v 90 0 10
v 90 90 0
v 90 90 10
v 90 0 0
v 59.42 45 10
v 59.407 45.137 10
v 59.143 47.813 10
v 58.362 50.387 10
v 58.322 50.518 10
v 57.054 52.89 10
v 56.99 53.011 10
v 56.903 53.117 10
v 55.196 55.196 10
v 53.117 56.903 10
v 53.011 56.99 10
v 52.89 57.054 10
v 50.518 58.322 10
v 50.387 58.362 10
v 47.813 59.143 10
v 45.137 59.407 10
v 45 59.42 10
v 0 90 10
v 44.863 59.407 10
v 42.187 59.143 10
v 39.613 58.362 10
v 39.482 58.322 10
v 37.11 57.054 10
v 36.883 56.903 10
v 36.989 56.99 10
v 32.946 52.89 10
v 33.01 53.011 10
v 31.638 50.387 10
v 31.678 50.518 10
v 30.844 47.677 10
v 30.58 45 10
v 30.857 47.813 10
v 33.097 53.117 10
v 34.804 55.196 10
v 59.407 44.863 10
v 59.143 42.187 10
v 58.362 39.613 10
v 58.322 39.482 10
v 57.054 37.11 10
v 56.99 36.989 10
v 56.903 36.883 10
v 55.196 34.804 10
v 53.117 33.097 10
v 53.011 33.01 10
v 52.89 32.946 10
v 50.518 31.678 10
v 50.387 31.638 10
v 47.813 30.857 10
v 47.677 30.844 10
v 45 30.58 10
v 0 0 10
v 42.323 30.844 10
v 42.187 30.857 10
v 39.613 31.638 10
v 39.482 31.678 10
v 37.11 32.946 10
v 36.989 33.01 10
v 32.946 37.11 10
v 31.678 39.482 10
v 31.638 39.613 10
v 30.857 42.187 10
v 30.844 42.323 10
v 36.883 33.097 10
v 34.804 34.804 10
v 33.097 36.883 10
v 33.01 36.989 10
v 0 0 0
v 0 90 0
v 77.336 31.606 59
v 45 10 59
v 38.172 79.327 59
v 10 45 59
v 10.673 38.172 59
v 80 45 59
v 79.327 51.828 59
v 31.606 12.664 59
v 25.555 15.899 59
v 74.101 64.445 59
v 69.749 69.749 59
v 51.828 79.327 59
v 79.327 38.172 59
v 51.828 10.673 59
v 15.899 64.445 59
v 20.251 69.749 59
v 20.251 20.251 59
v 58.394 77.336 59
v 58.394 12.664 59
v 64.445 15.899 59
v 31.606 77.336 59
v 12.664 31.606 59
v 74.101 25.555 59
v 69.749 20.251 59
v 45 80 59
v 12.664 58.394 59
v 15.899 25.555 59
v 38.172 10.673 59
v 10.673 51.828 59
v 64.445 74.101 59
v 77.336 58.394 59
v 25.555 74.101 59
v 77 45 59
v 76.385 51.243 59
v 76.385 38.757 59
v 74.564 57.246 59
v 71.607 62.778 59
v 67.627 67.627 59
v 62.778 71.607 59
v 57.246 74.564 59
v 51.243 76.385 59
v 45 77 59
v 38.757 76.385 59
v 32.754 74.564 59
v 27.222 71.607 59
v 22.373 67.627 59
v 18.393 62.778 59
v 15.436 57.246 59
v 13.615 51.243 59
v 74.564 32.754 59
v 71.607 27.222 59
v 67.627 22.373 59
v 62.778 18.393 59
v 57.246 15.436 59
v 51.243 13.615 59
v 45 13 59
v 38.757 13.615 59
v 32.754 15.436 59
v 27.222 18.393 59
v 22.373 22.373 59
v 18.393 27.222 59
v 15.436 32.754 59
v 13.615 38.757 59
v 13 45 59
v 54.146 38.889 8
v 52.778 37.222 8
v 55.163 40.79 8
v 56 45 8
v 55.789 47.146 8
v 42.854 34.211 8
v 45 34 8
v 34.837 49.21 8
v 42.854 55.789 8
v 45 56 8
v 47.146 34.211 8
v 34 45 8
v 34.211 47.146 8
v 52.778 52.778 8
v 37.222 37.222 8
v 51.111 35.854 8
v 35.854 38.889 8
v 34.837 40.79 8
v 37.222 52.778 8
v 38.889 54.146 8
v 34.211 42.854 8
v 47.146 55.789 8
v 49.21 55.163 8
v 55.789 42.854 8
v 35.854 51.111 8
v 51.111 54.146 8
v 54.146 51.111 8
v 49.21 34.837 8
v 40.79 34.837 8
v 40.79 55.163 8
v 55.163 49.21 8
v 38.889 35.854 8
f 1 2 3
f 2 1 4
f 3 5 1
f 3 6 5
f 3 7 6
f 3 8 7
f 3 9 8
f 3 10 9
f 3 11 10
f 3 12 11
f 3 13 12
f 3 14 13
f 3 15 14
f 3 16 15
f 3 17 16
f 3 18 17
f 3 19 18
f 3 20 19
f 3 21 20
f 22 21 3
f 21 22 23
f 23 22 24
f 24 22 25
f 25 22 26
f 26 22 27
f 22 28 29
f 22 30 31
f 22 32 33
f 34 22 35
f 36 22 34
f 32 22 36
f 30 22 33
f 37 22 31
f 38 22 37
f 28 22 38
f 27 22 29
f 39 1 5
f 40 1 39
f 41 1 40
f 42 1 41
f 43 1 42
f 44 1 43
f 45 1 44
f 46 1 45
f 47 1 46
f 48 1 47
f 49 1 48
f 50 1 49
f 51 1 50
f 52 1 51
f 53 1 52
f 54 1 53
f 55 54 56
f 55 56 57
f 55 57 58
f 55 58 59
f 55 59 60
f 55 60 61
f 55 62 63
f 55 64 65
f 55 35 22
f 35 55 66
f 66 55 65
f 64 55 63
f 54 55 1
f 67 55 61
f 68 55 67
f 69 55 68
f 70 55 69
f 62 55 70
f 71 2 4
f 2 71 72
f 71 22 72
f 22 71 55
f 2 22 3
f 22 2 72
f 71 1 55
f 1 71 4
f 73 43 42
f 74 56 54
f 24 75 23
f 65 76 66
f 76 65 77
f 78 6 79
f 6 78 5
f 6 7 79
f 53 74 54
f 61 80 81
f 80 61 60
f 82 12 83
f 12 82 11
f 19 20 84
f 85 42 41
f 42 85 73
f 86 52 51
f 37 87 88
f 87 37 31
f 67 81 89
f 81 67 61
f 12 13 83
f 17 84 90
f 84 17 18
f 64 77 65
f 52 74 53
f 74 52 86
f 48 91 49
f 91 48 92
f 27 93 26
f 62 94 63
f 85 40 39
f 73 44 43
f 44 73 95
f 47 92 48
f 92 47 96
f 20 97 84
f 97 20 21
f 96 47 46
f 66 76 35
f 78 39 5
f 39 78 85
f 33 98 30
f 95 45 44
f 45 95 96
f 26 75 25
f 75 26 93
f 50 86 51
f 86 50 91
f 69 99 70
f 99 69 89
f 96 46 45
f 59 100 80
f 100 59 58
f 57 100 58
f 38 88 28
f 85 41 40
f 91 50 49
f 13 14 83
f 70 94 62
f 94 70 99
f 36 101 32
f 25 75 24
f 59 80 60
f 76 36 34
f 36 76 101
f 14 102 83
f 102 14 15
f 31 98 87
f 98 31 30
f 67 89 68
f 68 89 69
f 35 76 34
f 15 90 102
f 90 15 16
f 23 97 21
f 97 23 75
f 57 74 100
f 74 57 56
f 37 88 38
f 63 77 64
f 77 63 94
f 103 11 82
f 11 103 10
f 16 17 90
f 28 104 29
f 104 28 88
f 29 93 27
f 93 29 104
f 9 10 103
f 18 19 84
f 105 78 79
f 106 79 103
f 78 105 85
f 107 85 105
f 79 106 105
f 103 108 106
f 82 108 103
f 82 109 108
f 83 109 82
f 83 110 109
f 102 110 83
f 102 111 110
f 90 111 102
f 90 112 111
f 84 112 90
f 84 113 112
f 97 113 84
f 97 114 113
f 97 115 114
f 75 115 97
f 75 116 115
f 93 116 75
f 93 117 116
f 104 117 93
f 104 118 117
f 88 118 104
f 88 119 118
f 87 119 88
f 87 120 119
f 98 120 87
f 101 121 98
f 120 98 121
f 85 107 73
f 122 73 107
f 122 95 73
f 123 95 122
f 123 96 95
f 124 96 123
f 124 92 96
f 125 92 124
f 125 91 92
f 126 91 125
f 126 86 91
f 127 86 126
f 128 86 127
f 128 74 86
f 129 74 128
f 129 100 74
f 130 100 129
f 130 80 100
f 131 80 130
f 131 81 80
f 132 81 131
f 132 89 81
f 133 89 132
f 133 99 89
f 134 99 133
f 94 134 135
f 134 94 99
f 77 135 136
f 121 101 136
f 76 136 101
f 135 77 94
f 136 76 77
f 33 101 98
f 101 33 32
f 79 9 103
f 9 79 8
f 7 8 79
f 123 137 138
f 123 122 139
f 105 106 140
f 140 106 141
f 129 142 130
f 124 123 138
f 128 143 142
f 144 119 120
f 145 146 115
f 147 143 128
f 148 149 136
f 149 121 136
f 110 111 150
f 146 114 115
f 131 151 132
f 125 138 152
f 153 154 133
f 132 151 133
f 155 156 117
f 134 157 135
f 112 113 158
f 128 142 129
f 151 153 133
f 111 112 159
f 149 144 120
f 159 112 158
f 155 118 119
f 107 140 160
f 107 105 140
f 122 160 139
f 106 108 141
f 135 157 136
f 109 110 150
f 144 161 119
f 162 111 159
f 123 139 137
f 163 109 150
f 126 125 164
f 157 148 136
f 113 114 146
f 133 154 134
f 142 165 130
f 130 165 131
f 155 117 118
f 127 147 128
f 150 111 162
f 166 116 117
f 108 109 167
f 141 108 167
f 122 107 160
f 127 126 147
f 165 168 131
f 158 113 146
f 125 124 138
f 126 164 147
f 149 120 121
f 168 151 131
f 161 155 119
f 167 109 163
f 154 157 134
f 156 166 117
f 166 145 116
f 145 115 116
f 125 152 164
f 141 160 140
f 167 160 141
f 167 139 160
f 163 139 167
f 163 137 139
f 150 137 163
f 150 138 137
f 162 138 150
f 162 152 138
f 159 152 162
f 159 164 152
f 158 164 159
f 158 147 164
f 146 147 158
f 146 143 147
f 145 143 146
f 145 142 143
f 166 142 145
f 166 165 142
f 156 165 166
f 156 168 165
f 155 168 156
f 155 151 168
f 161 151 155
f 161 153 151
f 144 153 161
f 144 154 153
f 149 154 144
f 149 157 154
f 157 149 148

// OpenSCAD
$fn = 32;

// ----------------------------------------------------------------------
// Hopper: funnel with square flange
// ----------------------------------------------------------------------

// --- parameters (mm) ---
fl = 90;                  // flange side, X and Y
fl_t = 10;                // flange thickness
cone_h = 50;              // cone height above the flange
top_d = 70;               // cone mouth diameter
bot_d = 28;               // cone spout diameter
wall = 3;                 // cone wall thickness

bore_d = bot_d - 2 * wall;  // spout bore diameter
total_h = fl_t + cone_h - 1;  // overall height

difference() {
  union() {
    cube([fl, fl, fl_t]);
    translate([fl / 2, fl / 2, fl_t - 1])
      cylinder(h = cone_h, d1 = bot_d, d2 = top_d);
  }
  translate([fl / 2, fl / 2, fl_t - 2])
    cylinder(h = cone_h + 1, d1 = bore_d, d2 = top_d - 2 * wall);
}
